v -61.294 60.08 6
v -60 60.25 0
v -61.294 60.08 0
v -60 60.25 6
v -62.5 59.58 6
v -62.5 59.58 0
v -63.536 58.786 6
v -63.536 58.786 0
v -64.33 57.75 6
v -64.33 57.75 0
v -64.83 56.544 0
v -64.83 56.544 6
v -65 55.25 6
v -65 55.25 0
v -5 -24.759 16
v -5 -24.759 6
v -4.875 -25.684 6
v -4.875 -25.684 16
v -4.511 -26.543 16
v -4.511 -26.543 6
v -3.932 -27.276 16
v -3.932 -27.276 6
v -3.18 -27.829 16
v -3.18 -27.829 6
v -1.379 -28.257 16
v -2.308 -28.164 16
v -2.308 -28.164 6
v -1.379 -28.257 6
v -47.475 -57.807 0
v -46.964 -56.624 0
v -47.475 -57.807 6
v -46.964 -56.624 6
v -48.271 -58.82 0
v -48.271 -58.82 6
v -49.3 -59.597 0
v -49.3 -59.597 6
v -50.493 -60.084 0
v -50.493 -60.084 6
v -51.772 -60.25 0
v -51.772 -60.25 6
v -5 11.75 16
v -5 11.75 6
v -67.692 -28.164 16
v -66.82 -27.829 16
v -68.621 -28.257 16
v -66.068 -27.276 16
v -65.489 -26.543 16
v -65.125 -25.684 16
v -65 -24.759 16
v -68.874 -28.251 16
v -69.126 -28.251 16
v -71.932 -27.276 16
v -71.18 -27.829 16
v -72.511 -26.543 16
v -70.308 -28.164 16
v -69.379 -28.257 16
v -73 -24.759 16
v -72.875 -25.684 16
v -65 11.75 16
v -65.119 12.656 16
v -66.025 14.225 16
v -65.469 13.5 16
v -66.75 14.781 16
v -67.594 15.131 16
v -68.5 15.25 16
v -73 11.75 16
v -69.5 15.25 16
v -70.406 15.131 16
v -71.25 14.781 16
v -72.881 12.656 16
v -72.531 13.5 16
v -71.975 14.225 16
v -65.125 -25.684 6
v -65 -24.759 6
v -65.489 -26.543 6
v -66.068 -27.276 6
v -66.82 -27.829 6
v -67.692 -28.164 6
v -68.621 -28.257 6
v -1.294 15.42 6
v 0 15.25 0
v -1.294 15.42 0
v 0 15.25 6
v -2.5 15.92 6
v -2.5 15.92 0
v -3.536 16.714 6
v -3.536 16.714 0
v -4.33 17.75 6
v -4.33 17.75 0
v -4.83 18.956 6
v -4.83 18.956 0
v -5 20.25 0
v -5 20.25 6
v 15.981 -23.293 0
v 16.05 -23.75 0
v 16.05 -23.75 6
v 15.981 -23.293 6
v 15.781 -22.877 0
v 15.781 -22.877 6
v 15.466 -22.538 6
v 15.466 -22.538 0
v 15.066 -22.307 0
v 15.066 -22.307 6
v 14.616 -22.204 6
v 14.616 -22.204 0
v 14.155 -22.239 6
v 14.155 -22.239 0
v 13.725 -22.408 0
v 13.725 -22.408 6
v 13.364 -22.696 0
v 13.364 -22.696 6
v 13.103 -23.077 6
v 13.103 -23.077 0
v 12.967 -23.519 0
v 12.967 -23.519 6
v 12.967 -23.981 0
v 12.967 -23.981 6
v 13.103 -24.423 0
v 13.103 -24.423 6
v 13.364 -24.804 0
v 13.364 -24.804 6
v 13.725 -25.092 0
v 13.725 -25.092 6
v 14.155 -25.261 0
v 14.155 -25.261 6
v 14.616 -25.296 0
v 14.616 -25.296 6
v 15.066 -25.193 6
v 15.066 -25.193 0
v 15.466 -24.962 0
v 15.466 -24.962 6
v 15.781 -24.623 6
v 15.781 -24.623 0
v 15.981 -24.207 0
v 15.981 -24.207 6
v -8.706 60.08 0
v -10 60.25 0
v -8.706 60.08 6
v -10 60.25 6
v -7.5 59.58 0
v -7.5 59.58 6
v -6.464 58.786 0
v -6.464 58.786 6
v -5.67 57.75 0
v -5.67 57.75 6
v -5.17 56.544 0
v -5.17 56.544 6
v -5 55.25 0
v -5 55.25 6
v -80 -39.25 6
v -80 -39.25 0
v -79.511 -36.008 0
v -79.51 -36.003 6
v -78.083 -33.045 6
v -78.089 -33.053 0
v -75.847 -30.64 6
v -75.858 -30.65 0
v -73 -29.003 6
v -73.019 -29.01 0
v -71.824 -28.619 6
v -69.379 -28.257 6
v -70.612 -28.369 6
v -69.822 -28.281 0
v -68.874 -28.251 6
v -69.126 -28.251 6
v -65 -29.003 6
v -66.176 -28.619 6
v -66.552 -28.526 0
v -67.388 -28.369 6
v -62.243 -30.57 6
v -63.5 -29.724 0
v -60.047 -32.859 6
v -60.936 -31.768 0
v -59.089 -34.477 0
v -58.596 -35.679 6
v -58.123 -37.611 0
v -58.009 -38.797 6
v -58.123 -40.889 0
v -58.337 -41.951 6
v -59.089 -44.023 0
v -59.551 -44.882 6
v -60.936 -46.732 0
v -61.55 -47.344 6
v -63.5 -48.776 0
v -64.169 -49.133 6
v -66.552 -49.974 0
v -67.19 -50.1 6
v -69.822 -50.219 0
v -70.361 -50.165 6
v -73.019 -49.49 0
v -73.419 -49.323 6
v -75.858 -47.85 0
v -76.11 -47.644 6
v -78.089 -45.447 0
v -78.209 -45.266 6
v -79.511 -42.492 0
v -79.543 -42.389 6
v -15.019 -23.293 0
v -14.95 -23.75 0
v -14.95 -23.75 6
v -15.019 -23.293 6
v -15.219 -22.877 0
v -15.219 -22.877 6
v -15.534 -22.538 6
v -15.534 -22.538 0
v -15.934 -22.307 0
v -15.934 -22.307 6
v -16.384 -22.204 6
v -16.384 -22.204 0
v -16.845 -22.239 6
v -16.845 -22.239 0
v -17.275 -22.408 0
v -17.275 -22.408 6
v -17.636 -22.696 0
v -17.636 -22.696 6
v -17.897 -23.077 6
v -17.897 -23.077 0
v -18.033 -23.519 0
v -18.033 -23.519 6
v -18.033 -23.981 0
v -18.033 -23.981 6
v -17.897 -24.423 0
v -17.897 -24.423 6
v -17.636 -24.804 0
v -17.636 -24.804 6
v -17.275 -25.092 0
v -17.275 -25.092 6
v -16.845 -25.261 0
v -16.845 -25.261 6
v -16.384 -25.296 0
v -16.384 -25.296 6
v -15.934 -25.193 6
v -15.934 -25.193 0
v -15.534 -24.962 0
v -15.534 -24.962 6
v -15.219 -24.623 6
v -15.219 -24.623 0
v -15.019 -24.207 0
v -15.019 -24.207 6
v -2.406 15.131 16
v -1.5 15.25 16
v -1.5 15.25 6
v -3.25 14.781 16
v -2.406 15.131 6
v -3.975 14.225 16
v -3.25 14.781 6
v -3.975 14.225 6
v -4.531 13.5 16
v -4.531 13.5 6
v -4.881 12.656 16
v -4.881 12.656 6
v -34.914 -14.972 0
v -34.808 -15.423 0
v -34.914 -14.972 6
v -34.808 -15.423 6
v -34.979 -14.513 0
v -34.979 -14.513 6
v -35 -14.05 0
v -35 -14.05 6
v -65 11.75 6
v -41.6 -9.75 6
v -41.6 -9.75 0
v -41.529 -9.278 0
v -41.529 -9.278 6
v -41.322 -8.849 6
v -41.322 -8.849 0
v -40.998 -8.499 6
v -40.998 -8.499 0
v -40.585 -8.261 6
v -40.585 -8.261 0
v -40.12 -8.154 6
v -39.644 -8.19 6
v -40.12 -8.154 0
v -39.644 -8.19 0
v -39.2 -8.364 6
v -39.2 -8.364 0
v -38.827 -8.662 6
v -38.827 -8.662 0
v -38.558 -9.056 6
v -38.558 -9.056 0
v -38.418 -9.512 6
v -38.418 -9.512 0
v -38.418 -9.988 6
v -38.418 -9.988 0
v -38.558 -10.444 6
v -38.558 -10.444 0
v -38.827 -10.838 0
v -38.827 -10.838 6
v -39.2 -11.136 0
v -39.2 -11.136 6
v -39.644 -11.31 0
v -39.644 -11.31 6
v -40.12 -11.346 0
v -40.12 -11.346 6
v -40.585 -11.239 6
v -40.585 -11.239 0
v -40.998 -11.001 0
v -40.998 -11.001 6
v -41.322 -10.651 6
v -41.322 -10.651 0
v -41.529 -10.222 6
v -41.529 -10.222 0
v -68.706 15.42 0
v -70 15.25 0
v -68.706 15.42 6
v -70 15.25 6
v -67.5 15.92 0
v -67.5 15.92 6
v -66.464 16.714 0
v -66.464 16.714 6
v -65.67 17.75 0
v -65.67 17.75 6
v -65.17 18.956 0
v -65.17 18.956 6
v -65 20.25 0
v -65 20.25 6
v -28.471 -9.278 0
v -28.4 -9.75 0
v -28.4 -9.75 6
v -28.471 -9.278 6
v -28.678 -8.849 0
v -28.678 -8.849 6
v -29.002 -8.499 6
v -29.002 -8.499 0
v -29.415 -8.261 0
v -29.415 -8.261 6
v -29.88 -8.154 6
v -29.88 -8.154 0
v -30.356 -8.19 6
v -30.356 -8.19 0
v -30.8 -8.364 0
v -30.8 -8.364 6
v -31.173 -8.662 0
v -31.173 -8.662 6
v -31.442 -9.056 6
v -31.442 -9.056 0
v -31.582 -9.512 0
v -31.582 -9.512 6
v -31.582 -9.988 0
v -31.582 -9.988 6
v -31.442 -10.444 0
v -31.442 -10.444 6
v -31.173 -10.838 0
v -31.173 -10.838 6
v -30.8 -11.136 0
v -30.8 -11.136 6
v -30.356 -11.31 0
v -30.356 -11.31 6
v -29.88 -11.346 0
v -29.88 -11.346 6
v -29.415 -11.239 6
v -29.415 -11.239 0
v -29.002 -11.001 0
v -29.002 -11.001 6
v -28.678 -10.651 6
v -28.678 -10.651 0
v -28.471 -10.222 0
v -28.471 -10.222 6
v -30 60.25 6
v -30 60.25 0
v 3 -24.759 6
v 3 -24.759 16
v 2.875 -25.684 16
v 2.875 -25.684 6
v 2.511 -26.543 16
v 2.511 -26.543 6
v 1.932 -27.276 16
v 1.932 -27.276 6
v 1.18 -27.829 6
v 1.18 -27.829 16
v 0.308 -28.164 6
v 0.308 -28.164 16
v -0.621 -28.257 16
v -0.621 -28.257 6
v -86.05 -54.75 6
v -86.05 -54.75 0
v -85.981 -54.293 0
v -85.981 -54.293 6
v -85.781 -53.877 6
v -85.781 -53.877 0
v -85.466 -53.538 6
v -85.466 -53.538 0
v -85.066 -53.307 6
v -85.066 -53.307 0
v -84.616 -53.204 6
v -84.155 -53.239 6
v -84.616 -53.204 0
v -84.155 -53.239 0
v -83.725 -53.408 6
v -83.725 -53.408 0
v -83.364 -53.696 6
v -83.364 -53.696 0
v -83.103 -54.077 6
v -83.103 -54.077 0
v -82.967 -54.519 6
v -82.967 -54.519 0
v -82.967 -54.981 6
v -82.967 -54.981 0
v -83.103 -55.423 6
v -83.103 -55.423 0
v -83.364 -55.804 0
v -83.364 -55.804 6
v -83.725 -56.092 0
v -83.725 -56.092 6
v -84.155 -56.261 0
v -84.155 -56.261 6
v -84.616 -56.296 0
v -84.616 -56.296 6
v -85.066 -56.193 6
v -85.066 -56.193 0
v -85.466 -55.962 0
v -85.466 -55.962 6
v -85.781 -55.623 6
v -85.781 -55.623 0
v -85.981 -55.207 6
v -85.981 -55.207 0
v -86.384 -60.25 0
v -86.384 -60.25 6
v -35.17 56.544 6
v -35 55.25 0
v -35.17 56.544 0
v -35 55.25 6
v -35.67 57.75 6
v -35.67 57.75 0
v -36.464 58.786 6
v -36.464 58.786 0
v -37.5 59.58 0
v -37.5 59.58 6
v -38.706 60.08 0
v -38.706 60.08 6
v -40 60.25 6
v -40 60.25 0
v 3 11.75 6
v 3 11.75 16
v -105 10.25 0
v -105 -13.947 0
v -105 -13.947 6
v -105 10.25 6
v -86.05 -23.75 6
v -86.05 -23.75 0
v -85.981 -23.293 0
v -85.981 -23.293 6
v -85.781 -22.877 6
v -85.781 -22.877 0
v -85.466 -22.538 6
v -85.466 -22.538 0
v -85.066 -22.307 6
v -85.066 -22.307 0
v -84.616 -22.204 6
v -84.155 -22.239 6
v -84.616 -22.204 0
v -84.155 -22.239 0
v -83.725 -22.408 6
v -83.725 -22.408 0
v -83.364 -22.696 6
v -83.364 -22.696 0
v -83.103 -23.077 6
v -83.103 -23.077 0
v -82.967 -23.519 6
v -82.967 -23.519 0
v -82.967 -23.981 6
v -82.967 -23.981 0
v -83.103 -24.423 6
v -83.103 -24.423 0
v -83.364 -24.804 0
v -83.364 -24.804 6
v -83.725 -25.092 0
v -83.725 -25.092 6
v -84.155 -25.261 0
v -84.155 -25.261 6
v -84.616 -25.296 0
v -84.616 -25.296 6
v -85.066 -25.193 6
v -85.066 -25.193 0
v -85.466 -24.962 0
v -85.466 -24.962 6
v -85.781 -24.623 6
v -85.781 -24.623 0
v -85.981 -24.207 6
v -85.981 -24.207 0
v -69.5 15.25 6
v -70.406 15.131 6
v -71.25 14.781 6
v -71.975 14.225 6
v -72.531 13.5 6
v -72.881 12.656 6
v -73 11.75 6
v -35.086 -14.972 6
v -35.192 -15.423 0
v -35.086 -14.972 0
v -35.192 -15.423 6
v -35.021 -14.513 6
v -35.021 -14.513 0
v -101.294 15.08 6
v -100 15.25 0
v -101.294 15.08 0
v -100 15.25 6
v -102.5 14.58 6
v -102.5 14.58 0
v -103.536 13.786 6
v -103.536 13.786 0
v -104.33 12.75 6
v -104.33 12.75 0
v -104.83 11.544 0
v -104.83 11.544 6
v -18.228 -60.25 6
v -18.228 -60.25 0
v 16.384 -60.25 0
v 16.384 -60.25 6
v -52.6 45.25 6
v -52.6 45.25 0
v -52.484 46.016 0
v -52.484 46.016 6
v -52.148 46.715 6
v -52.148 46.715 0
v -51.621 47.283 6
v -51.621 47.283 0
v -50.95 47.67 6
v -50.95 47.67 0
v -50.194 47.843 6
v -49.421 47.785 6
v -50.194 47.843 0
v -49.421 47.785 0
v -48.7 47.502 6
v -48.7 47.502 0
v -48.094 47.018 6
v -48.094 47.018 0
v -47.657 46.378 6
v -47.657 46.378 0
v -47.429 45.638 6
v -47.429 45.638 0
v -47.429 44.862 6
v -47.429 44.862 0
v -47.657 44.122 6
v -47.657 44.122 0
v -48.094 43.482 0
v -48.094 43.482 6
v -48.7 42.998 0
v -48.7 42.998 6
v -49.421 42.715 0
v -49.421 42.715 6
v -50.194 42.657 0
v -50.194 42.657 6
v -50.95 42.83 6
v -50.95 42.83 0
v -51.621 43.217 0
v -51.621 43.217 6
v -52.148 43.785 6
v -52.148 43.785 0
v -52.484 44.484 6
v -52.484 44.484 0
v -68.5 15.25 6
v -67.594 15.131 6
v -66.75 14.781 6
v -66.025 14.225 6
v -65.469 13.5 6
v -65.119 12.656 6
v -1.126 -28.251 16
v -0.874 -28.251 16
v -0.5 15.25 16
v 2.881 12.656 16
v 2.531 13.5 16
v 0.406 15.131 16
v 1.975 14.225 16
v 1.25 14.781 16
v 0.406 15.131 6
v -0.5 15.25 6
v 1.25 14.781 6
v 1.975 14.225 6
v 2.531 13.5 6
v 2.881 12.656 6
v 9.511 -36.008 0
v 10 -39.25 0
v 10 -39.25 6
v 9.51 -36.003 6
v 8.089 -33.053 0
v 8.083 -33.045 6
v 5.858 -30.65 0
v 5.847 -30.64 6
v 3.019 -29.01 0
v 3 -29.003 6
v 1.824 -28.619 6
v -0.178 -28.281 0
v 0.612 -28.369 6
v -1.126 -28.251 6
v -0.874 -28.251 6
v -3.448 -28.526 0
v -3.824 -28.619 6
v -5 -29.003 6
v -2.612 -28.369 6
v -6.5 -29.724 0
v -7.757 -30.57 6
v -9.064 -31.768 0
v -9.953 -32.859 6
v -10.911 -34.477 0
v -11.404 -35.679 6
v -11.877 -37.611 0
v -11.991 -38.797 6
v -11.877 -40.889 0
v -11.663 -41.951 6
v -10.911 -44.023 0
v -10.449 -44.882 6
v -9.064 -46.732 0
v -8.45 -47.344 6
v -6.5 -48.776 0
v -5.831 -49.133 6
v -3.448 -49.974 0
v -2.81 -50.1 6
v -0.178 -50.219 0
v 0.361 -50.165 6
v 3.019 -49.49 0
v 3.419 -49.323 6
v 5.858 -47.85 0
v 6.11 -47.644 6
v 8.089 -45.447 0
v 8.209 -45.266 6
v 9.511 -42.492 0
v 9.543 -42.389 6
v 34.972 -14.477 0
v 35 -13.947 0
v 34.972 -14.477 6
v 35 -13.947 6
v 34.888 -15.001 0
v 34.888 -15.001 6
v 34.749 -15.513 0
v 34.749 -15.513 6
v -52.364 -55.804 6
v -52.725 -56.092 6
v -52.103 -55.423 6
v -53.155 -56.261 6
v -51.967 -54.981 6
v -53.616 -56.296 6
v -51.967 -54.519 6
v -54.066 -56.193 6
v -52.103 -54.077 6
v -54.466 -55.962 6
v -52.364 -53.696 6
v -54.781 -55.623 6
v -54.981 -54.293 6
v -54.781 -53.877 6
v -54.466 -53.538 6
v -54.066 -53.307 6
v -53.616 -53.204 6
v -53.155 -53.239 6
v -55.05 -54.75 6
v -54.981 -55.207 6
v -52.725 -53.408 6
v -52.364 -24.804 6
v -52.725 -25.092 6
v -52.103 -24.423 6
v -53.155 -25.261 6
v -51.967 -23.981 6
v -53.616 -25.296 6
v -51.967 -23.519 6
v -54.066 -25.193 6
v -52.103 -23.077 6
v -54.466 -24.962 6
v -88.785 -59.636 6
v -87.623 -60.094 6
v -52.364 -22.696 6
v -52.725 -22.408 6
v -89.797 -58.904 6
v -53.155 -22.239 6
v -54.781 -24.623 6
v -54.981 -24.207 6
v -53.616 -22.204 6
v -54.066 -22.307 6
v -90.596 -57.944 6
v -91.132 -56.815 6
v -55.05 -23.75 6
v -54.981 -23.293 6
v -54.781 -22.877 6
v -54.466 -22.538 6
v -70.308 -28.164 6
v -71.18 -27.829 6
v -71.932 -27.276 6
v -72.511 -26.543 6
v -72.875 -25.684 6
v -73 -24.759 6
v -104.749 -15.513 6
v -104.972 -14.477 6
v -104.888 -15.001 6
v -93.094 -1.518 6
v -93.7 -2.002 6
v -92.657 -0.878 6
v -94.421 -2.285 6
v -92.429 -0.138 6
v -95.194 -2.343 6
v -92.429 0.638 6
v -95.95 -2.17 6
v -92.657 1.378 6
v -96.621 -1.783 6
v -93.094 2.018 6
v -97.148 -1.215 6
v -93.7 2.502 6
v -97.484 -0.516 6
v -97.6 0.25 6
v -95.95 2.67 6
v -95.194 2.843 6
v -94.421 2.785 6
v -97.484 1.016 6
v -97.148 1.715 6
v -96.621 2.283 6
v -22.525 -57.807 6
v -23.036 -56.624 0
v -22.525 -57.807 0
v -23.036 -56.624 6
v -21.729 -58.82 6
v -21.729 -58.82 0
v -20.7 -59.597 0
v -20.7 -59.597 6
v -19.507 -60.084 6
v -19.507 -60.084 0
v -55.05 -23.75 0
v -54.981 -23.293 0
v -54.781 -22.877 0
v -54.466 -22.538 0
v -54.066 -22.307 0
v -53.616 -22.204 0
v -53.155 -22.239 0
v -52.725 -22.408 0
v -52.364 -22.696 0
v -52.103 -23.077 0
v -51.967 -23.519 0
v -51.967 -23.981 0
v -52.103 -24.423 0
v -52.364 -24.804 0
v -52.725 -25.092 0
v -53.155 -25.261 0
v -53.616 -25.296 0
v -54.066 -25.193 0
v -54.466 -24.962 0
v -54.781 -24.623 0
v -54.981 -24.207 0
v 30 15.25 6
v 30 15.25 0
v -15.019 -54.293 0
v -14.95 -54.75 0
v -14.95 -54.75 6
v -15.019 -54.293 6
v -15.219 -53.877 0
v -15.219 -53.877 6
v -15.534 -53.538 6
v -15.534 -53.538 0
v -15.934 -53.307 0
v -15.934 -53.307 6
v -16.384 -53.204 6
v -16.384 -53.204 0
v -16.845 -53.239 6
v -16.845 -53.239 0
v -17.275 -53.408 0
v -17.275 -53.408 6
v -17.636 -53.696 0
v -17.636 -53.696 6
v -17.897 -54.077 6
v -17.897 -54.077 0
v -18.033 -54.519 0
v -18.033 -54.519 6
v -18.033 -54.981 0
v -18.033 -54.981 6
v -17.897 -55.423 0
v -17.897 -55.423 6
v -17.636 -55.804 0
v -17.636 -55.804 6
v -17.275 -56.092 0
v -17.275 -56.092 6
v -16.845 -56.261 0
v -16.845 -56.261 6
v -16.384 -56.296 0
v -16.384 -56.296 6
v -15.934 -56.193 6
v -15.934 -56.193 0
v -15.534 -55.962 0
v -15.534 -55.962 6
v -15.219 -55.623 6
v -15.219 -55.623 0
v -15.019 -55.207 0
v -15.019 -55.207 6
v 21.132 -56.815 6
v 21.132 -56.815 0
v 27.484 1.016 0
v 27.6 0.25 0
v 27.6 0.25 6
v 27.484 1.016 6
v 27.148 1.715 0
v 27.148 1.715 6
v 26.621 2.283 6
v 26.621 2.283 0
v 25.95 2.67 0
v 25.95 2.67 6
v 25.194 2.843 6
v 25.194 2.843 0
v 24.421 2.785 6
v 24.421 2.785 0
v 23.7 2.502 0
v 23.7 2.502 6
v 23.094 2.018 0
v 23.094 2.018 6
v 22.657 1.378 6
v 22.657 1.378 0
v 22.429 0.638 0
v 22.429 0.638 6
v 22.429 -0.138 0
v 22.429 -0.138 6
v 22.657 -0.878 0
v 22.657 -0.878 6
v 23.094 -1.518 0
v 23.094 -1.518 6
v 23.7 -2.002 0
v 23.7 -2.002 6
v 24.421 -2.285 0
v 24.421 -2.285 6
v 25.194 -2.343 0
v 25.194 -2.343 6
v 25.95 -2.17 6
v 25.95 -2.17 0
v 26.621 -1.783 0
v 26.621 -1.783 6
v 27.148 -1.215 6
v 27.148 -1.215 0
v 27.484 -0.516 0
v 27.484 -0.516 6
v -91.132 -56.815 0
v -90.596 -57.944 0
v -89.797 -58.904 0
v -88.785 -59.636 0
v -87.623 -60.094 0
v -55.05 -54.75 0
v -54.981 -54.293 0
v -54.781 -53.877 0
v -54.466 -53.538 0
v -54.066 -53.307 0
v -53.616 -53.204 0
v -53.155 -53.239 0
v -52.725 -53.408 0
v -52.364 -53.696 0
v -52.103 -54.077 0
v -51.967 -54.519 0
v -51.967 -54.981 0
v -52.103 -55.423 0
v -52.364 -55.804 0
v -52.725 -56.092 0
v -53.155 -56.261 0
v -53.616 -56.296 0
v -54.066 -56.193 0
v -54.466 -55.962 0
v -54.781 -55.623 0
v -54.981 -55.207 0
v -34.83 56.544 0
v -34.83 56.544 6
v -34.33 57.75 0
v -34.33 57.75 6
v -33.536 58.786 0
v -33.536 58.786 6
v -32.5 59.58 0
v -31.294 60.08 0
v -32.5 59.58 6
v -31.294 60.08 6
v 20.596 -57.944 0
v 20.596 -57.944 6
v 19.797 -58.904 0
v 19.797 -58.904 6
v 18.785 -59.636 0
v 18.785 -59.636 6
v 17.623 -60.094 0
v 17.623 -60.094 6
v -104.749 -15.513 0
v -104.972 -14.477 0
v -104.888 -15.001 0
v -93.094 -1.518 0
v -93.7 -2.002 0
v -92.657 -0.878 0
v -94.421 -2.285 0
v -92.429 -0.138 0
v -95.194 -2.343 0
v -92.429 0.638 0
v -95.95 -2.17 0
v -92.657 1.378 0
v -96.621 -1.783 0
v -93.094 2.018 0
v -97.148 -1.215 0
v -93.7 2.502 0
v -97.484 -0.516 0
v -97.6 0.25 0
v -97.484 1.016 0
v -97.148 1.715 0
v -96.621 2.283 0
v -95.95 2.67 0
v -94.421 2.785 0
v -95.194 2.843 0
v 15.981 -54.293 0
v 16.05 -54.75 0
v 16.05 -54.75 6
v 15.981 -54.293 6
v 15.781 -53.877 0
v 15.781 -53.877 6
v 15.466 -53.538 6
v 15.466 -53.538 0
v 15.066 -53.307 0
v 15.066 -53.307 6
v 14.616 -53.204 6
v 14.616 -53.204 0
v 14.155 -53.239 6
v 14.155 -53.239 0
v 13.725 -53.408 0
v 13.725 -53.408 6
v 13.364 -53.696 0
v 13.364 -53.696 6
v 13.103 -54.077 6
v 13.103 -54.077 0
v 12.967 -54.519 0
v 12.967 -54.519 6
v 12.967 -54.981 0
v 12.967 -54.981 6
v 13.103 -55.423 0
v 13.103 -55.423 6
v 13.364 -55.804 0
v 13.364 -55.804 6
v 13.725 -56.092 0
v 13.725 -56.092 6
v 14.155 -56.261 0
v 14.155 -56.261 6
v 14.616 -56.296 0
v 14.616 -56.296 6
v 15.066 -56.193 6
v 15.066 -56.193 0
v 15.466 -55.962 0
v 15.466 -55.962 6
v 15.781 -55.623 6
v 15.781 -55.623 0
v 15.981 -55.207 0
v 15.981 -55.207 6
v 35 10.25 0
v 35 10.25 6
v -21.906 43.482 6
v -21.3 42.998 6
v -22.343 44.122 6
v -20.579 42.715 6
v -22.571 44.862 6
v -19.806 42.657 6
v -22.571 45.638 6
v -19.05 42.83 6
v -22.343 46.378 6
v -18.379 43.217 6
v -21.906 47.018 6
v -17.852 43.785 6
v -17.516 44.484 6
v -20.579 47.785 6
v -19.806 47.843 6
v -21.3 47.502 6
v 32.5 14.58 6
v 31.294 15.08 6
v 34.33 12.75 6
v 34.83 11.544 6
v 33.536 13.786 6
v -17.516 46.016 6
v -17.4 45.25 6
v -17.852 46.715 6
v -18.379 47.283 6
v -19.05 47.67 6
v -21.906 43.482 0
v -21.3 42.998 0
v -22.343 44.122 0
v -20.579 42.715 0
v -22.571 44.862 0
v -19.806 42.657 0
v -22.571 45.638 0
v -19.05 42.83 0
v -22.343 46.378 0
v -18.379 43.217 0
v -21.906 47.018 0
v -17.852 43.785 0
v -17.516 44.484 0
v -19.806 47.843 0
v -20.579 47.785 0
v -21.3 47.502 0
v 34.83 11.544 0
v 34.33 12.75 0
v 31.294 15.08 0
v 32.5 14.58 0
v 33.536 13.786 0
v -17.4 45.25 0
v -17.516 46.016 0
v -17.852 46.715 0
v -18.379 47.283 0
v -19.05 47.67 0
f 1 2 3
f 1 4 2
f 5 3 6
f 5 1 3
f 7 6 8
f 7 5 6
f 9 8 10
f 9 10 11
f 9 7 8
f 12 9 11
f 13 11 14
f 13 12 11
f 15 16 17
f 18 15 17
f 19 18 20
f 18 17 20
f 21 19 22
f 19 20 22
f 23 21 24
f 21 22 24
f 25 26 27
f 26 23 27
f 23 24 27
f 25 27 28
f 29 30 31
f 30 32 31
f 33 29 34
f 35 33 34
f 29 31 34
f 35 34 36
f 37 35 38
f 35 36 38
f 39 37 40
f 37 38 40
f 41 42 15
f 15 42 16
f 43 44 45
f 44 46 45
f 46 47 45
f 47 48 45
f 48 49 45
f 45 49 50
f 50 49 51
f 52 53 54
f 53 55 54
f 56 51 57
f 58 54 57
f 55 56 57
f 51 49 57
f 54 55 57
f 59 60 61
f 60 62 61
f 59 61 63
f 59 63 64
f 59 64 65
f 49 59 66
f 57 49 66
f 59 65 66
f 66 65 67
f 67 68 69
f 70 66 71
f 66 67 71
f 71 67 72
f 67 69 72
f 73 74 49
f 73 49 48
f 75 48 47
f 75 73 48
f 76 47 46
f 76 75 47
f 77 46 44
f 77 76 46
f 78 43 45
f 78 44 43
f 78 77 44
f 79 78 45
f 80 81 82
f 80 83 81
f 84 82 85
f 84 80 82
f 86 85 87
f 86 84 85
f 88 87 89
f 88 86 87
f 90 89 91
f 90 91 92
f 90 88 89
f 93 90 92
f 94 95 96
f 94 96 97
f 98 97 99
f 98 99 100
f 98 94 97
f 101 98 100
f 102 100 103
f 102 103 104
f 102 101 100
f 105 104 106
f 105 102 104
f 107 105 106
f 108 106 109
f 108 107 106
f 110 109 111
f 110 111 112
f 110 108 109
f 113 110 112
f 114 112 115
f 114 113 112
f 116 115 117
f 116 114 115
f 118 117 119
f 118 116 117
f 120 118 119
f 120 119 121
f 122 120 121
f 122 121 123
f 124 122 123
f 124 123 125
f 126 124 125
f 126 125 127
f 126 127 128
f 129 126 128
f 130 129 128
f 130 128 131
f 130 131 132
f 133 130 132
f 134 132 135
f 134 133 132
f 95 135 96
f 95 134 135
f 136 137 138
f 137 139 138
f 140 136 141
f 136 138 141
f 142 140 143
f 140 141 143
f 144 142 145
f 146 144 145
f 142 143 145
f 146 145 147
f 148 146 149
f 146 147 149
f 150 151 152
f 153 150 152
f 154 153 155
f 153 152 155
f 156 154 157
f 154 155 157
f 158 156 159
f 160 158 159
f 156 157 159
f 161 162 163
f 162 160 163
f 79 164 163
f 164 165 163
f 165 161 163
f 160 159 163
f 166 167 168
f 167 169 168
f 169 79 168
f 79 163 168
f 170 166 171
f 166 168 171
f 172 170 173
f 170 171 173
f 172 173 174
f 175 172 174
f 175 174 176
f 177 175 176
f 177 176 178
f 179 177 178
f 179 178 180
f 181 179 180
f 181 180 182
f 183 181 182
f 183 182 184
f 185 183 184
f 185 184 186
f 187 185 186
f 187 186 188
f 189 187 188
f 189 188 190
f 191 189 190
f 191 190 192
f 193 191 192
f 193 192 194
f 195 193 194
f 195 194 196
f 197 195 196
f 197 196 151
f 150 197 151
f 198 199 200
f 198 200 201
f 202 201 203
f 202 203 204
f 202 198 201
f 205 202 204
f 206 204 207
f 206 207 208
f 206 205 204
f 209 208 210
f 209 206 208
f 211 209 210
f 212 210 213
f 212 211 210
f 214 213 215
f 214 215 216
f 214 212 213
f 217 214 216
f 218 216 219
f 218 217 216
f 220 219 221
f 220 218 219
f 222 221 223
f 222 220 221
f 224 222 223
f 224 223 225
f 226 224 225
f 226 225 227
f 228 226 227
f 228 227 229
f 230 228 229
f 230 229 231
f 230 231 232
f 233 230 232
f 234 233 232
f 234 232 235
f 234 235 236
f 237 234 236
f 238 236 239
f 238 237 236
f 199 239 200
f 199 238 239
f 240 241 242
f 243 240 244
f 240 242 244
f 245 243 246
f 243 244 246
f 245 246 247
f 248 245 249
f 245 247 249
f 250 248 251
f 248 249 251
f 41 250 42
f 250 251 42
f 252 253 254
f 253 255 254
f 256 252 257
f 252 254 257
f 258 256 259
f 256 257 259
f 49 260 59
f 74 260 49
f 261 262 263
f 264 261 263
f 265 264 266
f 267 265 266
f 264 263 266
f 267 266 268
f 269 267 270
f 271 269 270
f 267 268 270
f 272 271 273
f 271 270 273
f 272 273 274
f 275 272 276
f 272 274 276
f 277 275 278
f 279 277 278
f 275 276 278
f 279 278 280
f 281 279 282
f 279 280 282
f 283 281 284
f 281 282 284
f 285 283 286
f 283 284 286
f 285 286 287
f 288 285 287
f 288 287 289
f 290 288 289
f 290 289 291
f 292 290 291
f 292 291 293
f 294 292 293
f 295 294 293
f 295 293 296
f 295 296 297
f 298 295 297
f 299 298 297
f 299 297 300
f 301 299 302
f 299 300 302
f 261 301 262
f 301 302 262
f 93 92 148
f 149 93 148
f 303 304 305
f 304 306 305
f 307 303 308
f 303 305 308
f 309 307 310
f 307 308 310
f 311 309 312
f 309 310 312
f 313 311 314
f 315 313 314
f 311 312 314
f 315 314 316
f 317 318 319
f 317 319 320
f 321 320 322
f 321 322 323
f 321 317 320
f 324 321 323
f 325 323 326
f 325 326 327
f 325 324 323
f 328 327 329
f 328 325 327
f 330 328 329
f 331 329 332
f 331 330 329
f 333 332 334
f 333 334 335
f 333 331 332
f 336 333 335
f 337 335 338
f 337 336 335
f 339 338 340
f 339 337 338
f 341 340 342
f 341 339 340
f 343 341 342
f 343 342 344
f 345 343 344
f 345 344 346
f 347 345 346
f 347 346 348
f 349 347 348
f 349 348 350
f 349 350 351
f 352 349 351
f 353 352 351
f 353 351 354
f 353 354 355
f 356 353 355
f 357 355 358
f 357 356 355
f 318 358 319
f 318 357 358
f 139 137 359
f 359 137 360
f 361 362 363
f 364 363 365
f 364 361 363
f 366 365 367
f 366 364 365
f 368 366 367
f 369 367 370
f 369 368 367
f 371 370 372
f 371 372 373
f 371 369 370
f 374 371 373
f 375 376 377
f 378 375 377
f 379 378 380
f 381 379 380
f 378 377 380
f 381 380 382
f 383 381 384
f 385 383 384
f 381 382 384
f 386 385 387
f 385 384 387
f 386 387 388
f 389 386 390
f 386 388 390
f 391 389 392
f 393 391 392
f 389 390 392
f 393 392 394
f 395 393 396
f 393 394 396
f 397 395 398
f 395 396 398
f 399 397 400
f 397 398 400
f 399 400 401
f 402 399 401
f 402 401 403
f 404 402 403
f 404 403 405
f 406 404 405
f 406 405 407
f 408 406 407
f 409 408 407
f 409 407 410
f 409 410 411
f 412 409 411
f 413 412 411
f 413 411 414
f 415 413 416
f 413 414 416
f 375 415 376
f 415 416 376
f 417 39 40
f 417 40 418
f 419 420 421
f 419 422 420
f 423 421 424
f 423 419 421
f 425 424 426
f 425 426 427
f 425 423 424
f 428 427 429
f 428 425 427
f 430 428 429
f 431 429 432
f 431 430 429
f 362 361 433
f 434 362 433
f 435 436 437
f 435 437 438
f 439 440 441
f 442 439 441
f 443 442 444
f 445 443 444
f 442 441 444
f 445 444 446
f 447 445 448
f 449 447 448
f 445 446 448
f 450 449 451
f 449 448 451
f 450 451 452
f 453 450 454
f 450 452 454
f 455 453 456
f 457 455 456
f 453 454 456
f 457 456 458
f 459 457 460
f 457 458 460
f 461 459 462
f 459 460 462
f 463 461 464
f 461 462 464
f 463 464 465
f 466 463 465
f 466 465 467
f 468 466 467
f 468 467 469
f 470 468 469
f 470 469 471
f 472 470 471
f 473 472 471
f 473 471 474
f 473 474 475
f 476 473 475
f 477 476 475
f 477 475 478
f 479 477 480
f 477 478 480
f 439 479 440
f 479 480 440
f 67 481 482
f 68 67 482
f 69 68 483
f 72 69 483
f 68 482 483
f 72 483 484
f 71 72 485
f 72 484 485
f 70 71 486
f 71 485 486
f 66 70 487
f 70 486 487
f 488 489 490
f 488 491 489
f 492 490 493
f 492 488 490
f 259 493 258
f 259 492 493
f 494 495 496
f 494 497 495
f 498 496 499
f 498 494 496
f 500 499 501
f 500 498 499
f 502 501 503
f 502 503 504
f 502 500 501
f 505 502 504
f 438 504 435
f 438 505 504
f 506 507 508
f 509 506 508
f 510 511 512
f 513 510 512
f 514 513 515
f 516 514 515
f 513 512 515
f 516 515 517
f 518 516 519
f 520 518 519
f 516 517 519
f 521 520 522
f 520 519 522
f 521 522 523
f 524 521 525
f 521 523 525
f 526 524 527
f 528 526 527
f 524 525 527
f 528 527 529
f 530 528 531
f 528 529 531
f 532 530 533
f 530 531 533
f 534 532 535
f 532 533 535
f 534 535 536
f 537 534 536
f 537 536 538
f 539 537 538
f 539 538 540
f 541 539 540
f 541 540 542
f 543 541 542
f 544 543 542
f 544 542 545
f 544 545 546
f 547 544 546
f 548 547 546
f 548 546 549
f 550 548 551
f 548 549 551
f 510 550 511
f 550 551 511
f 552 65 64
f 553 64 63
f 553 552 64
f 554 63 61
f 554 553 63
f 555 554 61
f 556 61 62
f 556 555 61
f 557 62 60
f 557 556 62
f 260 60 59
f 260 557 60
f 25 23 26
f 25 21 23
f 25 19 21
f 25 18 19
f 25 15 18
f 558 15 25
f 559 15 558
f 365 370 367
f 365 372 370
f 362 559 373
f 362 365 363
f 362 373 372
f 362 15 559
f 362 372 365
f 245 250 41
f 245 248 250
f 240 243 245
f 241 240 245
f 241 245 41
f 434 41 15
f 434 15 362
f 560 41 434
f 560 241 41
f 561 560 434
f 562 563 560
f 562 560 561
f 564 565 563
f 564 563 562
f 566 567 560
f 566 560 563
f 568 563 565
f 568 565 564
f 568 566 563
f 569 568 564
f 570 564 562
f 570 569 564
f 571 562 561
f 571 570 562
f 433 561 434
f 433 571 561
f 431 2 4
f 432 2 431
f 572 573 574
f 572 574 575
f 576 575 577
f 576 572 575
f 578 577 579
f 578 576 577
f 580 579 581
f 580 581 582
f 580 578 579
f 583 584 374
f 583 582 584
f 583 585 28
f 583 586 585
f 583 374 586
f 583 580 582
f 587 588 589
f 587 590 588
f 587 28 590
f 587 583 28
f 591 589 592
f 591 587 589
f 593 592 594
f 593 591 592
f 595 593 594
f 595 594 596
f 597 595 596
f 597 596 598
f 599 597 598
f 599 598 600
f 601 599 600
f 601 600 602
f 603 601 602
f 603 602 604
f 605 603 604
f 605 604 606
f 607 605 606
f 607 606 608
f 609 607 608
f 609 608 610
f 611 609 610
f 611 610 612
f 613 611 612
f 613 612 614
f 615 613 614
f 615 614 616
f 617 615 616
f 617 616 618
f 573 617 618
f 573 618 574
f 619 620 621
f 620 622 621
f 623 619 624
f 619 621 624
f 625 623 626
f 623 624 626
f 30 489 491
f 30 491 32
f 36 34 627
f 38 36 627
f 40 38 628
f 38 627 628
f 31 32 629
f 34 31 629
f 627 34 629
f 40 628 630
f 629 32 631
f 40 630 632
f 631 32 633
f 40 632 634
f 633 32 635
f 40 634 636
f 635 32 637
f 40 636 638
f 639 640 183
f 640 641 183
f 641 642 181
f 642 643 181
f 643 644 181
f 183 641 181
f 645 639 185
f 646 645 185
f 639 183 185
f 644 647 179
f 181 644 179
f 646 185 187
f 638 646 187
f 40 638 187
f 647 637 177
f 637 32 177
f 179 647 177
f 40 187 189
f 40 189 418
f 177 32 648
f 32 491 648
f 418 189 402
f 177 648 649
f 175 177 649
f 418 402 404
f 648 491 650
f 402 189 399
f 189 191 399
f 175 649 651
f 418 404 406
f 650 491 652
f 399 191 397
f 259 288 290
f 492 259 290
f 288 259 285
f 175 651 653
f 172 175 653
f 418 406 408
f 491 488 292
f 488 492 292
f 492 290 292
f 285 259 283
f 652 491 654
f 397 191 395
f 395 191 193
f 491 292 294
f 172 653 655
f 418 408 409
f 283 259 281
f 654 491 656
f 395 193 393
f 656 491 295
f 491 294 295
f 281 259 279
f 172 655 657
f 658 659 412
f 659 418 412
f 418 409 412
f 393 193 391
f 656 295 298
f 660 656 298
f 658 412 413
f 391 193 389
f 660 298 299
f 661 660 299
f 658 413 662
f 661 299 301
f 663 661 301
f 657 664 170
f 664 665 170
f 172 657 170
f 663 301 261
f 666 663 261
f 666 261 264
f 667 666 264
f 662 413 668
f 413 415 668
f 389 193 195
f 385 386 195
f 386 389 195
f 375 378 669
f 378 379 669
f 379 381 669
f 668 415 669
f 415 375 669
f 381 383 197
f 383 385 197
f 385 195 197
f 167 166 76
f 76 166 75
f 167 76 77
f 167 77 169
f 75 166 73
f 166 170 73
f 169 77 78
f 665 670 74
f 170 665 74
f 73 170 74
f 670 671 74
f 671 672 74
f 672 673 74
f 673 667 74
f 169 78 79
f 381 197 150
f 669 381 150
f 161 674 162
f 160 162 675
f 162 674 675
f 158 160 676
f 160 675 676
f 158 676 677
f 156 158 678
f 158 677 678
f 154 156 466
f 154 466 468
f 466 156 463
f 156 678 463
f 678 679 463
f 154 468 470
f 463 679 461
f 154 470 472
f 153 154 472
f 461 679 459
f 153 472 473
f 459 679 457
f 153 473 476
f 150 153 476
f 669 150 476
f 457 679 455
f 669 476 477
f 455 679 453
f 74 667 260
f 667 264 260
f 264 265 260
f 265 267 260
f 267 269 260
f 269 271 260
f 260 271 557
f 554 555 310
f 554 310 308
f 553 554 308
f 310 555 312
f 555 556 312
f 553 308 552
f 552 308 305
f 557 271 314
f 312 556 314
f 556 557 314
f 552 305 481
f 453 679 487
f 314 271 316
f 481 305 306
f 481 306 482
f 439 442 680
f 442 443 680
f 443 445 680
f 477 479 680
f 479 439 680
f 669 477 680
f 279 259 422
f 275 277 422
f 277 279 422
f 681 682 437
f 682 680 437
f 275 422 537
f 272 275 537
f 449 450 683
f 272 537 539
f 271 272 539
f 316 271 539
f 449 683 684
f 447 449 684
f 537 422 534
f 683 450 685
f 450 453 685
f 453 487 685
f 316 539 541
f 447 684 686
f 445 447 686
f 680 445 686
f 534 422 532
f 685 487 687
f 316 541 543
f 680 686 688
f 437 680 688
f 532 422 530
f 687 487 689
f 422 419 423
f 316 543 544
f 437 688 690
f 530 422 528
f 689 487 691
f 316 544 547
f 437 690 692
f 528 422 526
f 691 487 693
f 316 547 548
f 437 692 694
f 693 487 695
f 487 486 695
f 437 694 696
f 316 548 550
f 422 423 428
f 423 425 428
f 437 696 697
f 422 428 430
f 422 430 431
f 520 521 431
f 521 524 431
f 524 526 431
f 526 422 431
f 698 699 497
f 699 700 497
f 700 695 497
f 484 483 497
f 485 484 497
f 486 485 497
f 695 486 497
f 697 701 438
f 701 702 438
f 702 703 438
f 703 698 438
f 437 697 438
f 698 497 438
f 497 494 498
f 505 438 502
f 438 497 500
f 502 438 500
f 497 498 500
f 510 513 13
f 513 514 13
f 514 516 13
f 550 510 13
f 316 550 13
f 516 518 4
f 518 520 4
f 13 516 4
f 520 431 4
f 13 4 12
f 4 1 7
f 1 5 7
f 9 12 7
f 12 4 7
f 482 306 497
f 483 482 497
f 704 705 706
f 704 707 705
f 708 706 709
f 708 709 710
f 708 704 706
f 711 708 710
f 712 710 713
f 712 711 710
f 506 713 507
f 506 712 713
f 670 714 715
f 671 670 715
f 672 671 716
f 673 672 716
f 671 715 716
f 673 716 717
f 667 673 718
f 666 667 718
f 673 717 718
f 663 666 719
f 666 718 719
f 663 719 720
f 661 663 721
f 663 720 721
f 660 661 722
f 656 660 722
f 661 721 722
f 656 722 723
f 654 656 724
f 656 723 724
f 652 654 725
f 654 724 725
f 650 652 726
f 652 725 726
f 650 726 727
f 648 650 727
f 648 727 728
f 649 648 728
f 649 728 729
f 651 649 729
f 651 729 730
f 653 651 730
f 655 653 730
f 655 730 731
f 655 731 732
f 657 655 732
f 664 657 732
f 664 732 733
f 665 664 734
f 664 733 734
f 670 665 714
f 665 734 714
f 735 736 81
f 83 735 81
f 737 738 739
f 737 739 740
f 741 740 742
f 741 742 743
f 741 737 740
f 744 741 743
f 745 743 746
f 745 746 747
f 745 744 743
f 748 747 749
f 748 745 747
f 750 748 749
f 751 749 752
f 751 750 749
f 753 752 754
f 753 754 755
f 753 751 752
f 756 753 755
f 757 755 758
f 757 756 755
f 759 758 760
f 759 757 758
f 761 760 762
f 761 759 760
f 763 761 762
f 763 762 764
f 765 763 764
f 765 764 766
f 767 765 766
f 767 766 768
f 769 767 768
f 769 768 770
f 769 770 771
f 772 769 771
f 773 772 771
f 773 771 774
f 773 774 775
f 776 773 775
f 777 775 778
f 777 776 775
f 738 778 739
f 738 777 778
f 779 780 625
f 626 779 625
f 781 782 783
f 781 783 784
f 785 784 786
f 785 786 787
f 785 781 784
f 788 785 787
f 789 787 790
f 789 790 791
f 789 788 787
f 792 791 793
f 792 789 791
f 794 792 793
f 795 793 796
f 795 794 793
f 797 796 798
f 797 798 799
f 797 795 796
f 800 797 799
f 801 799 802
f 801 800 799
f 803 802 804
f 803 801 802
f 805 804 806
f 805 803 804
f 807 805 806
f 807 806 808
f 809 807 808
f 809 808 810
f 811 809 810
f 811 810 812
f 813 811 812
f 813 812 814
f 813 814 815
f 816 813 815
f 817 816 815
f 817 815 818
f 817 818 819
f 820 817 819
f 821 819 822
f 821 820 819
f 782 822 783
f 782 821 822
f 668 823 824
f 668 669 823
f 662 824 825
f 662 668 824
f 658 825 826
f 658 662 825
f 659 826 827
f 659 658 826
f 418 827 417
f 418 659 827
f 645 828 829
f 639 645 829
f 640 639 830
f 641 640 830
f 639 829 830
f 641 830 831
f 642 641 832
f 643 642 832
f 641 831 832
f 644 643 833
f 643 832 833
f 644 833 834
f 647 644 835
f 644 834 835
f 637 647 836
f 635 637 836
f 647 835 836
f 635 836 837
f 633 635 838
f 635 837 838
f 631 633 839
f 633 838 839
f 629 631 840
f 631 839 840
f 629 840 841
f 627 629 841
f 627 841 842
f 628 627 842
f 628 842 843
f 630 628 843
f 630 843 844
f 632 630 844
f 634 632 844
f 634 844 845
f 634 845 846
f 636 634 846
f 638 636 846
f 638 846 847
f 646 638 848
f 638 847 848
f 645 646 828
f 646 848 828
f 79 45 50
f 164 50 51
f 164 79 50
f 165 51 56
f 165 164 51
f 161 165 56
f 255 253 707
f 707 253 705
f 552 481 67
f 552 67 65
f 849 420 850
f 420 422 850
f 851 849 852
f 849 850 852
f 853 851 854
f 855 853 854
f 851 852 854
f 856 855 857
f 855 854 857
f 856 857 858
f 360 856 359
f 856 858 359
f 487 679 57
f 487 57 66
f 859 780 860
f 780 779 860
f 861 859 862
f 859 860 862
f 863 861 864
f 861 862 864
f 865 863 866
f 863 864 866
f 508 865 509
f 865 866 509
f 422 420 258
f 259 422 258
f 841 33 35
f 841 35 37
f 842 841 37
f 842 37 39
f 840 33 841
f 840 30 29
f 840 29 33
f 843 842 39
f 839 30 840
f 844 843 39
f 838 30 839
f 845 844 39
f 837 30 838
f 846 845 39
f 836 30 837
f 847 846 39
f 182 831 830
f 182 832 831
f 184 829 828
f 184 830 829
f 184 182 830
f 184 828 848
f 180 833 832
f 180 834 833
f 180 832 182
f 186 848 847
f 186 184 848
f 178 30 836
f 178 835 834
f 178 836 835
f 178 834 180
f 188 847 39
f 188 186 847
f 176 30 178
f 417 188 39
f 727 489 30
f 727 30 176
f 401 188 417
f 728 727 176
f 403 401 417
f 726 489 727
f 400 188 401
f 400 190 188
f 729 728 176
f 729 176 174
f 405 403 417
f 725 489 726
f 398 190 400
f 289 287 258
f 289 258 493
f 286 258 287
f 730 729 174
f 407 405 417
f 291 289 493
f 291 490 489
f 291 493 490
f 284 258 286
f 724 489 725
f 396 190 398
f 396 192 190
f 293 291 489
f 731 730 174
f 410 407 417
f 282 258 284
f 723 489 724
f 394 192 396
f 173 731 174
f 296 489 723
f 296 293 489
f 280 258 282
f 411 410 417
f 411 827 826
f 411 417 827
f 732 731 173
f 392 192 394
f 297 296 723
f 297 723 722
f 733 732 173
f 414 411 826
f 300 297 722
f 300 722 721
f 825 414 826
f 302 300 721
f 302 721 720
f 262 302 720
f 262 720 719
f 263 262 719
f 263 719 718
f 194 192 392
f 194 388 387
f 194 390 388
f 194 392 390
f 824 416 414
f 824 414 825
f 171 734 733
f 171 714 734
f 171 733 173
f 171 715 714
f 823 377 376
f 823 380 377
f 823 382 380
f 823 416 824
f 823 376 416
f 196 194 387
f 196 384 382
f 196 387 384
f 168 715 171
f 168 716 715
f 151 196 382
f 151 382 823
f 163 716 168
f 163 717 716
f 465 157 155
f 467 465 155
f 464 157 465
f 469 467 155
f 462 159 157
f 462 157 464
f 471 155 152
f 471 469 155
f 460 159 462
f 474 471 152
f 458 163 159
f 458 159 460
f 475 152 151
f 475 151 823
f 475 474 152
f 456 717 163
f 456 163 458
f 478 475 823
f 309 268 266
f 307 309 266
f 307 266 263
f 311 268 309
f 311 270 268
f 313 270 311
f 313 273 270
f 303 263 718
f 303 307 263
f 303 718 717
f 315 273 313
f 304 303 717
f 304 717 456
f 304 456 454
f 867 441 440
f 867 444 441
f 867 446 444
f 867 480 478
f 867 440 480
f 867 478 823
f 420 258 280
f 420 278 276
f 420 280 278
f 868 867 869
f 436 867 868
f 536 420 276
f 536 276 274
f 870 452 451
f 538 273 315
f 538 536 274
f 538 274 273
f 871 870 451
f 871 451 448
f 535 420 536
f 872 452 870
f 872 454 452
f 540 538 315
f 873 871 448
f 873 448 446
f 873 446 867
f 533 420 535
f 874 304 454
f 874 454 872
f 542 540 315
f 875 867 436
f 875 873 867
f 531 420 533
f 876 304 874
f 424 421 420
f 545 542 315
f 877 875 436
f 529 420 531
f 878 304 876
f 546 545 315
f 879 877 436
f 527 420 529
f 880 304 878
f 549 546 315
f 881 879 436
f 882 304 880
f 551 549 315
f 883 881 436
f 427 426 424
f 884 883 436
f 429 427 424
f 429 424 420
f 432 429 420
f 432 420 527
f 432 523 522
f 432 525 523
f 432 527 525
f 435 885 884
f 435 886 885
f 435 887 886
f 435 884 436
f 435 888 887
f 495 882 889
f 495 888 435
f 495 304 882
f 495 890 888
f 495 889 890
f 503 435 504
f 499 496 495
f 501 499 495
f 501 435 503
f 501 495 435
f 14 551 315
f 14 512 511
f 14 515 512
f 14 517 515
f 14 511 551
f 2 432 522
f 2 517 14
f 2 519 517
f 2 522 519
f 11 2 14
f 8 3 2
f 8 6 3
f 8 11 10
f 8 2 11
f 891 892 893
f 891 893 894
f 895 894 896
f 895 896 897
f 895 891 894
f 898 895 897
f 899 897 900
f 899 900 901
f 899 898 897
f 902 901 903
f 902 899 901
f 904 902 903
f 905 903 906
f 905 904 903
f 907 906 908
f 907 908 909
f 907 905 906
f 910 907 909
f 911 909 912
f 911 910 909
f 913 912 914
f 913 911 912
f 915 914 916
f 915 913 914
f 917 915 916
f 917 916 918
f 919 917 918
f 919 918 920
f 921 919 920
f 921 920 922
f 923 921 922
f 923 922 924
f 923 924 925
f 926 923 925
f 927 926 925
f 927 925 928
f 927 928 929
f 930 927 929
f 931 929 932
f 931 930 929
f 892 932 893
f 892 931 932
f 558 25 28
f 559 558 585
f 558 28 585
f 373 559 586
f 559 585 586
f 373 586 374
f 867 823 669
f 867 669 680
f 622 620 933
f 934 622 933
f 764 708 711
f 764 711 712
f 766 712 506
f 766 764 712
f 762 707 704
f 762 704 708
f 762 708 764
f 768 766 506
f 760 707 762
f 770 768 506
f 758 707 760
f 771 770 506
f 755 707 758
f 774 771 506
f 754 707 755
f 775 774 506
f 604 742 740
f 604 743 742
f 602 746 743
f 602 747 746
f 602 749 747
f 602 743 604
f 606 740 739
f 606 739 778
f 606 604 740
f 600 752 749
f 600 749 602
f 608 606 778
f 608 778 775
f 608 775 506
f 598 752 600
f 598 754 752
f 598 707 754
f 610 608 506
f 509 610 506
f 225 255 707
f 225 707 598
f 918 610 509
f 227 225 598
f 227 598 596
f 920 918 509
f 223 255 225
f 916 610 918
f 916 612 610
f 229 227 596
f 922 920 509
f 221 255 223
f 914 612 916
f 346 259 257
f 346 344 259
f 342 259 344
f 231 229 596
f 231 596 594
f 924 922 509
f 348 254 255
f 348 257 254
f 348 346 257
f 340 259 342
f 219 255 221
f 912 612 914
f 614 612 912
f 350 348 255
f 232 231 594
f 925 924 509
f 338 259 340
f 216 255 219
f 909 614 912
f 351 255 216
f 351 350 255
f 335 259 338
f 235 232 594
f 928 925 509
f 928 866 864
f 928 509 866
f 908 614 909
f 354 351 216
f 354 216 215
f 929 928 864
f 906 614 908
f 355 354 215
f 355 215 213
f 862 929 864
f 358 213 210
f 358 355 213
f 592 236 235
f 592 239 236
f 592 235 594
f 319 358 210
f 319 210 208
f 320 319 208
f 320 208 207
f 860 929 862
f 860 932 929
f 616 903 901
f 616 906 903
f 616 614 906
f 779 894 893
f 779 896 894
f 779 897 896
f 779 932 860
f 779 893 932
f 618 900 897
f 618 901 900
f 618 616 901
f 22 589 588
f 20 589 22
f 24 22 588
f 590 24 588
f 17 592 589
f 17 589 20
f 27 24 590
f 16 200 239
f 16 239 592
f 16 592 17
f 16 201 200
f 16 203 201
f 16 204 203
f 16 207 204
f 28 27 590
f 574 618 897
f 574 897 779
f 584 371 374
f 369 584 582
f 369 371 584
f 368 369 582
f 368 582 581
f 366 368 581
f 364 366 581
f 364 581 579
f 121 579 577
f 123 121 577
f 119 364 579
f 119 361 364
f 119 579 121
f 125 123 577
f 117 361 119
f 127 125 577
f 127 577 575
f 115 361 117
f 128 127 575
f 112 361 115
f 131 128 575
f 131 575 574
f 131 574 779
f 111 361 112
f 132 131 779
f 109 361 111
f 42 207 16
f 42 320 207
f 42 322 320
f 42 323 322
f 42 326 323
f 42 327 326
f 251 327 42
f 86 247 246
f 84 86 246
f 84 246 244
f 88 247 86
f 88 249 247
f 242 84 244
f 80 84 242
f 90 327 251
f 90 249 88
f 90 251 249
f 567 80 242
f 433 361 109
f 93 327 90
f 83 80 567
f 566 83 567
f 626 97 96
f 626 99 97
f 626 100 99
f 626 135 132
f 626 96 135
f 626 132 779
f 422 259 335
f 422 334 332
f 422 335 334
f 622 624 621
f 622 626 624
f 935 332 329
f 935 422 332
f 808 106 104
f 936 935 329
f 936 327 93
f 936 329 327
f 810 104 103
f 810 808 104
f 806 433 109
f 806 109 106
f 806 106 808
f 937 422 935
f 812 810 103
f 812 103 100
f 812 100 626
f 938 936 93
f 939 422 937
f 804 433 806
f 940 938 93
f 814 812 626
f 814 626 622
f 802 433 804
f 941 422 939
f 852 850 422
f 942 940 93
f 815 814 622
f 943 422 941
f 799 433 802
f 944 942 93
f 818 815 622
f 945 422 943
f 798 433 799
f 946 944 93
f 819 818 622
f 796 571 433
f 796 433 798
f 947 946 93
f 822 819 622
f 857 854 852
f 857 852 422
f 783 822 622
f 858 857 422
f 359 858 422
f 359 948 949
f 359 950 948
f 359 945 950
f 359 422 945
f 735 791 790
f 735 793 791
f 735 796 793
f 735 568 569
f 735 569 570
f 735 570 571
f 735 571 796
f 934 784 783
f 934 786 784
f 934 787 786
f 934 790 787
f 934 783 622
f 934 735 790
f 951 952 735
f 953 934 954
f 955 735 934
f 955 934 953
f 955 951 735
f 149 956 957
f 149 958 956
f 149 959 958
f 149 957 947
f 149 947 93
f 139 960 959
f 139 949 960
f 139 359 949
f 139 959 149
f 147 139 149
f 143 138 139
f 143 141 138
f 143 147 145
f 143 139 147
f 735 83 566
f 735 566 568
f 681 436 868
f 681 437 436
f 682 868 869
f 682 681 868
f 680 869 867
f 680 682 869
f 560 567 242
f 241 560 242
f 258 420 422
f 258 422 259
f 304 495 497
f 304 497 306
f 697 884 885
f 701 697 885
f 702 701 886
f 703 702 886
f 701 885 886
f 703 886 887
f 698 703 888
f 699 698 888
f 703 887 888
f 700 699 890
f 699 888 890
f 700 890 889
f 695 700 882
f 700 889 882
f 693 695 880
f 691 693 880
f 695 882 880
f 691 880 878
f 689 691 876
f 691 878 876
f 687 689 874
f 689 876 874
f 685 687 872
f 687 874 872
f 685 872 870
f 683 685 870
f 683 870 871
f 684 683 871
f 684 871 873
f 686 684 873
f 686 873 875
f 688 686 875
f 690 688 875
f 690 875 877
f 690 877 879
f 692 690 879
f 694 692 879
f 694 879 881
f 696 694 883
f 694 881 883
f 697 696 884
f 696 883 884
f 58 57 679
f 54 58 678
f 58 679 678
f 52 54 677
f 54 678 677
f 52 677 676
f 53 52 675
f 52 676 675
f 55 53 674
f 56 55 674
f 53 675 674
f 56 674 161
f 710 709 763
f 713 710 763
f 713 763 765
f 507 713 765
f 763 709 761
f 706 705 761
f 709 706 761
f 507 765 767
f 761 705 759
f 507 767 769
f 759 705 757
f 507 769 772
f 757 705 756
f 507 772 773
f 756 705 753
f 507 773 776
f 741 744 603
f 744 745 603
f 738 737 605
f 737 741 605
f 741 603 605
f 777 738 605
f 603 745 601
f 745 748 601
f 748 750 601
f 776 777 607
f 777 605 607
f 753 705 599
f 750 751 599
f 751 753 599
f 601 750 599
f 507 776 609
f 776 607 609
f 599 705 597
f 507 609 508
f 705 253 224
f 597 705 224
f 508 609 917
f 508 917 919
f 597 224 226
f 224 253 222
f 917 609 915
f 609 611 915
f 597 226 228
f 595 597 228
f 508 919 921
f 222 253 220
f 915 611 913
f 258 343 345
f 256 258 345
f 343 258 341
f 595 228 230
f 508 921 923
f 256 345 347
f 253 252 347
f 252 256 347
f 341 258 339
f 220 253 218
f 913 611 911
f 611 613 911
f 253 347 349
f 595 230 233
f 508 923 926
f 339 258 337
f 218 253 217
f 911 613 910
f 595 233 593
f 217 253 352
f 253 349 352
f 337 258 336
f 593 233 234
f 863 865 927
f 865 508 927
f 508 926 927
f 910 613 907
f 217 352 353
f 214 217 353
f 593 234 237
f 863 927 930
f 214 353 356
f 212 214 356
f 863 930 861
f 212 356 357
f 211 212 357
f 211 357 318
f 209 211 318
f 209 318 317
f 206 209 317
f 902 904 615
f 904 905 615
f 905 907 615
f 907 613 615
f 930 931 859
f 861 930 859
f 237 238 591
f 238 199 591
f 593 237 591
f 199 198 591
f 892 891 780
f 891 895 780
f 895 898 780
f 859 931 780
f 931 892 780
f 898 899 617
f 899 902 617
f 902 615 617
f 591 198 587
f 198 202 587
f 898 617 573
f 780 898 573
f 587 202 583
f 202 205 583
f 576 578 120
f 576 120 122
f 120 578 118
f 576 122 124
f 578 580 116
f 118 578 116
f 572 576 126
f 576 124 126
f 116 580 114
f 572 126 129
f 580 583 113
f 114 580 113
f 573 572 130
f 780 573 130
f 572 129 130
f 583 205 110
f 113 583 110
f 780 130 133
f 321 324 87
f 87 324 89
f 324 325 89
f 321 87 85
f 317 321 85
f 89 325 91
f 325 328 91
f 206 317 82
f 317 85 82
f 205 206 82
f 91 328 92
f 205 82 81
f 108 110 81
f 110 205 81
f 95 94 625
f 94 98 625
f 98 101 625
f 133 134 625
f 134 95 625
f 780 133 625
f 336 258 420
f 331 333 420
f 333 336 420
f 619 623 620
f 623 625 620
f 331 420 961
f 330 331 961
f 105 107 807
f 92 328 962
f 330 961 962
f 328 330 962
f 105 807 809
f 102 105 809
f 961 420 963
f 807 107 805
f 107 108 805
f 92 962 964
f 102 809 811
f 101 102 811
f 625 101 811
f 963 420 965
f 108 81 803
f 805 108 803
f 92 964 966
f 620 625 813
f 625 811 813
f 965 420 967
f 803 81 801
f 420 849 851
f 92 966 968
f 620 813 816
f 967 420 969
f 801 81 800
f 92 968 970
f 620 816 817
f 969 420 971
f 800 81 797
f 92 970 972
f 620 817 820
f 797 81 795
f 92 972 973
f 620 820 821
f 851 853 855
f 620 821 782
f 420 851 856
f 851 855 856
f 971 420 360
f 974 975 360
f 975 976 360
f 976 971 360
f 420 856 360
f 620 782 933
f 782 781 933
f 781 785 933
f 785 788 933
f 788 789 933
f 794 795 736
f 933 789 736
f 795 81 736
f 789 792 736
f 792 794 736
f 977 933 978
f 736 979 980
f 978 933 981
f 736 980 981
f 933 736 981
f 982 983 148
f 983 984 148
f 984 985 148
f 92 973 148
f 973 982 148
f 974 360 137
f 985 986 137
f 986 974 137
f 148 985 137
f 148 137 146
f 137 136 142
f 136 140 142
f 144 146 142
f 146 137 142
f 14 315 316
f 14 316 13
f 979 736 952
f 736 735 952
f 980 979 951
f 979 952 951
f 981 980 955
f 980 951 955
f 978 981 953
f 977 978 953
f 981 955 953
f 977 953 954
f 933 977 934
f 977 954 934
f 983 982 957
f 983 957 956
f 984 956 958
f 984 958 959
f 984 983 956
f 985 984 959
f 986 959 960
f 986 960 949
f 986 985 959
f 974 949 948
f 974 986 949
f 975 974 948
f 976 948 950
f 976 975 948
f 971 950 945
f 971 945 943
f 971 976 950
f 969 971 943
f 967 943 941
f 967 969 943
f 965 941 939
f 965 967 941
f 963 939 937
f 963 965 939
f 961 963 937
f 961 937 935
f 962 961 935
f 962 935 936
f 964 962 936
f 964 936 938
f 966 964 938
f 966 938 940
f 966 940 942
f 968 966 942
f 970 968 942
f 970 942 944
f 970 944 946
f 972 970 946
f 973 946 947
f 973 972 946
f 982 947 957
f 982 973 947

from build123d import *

# Parameters (mm, degrees)
F0_R        = 1.55
F0_R_2      = 11
F0_R_3      = 1.6
F0_R_4      = 2.6
F1_DEPTH    = 6
F3_DEPTH    = 10
F4_R        = 5
F5_T1_DEPTH = 18.75
F5_T3_DEPTH = 20.6110649506


# Not quite as in the source:
# - a fillet or chamfer that OpenCascade refuses, or shapes differently, is made with other operations: its cross-section is extruded or revolved along the edge and cut away or added


with BuildPart() as f1:
    # F0 (on Top) → F1 (new body)
    with BuildSketch(Plane.XY):
        Polygon((-22, -60.25), (20, -60.25), (35, -14.75), (35, 15.25), (-5, 15.25), (-5, 60.25), (-35, 60.25), (-35, -14.75), align=None)
        with Locations((-16.5, -54.75)):
            Circle(F0_R, mode=Mode.SUBTRACT)
        with Locations((-1, -39.25)):
            Circle(F0_R_2, mode=Mode.SUBTRACT)
        with Locations((-30, -9.75)):
            Circle(F0_R_3, mode=Mode.SUBTRACT)
        with Locations((-16.5, -23.75)):
            Circle(F0_R, mode=Mode.SUBTRACT)
        with Locations((14.5, -54.75)):
            Circle(F0_R, mode=Mode.SUBTRACT)
        with Locations((14.5, -23.75)):
            Circle(F0_R, mode=Mode.SUBTRACT)
        with Locations((-20, 45.25)):
            Circle(F0_R_4, mode=Mode.SUBTRACT)
        with Locations((25, 0.25)):
            Circle(F0_R_4, mode=Mode.SUBTRACT)
    extrude(amount=F1_DEPTH)

    # F2 (on face) → F3 (join)
    with BuildSketch(Plane.XY.offset(6)):
        with BuildLine():
            ThreePointArc((-5, -29.003049234), (-1, -28.25), (3, -29.003049234))
            Line((3, -29.003049234), (3, 15.25))
            Line((3, 15.25), (-5, 15.25))
            Line((-5, 15.25), (-5, -29.003049234))
        make_face()
    extrude(amount=F3_DEPTH)

    # F4
    f4_edges = [f1.edges().sort_by_distance(p)[0] for p in [
        (-35, 60.25, 3),
        (-5, 60.25, 3),
        (35, 15.25, 3),
        (-5, 15.25, 3),
        (20, -60.25, 3),
        (-22, -60.25, 3),
        (35, -14.75, 3),
        (-35, -14.75, 3),
    ]]
    fillet(f4_edges, radius=F4_R)

    # F5: fillet of radius 3.5 on 4 edges, made by hand

    # F5_s2 → F5_t1 (cut)
    with BuildSketch(Plane.XY.offset(6)):
        with BuildLine():
            ThreePointArc((-1.5, 15.25), (-3.9748737342, 14.2248737342), (-5, 11.75))
            Line((-5, 11.75), (-5, 15.25))
            Line((-5, 15.25), (-1.5, 15.25))
        make_face()
        with BuildLine():
            ThreePointArc((-0.5, 15.25), (1.9748737342, 14.2248737342), (3, 11.75))
            Line((3, 11.75), (3, 15.25))
            Line((3, 15.25), (-0.5, 15.25))
        make_face()
    extrude(amount=F5_T1_DEPTH, mode=Mode.SUBTRACT)

    # F5_s4 → F5_t3 (cut)
    with BuildSketch(Plane.XY.offset(6)):
        with BuildLine():
            ThreePointArc((-5, -24.7586232538), (-3.9318291682, -27.2758055866), (-1.3793103448, -28.2565417788))
            ThreePointArc((-1.3793103448, -28.2565417788), (-3.221240221, -28.4766025841), (-5, -29.003049234))
            Line((-5, -29.003049234), (-5, -24.7586232538))
        make_face()
        with BuildLine():
            ThreePointArc((3, -24.7586232538), (1.9318291682, -27.2758055866), (-0.6206896552, -28.2565417788))
            ThreePointArc((-0.6206896552, -28.2565417788), (1.221240221, -28.4766025841), (3, -29.003049234))
            Line((3, -29.003049234), (3, -24.7586232538))
        make_face()
    extrude(amount=F5_T3_DEPTH, mode=Mode.SUBTRACT)


with BuildPart() as f6_1:
    # F6: instance of F1
    add(f1.part.mirror(Plane(origin=(-35, 20.6001373616, 3), x_dir=(0, -1, 0), z_dir=(-1, 0, 0))))


solid = Compound([f1.part, f6_1.part])
